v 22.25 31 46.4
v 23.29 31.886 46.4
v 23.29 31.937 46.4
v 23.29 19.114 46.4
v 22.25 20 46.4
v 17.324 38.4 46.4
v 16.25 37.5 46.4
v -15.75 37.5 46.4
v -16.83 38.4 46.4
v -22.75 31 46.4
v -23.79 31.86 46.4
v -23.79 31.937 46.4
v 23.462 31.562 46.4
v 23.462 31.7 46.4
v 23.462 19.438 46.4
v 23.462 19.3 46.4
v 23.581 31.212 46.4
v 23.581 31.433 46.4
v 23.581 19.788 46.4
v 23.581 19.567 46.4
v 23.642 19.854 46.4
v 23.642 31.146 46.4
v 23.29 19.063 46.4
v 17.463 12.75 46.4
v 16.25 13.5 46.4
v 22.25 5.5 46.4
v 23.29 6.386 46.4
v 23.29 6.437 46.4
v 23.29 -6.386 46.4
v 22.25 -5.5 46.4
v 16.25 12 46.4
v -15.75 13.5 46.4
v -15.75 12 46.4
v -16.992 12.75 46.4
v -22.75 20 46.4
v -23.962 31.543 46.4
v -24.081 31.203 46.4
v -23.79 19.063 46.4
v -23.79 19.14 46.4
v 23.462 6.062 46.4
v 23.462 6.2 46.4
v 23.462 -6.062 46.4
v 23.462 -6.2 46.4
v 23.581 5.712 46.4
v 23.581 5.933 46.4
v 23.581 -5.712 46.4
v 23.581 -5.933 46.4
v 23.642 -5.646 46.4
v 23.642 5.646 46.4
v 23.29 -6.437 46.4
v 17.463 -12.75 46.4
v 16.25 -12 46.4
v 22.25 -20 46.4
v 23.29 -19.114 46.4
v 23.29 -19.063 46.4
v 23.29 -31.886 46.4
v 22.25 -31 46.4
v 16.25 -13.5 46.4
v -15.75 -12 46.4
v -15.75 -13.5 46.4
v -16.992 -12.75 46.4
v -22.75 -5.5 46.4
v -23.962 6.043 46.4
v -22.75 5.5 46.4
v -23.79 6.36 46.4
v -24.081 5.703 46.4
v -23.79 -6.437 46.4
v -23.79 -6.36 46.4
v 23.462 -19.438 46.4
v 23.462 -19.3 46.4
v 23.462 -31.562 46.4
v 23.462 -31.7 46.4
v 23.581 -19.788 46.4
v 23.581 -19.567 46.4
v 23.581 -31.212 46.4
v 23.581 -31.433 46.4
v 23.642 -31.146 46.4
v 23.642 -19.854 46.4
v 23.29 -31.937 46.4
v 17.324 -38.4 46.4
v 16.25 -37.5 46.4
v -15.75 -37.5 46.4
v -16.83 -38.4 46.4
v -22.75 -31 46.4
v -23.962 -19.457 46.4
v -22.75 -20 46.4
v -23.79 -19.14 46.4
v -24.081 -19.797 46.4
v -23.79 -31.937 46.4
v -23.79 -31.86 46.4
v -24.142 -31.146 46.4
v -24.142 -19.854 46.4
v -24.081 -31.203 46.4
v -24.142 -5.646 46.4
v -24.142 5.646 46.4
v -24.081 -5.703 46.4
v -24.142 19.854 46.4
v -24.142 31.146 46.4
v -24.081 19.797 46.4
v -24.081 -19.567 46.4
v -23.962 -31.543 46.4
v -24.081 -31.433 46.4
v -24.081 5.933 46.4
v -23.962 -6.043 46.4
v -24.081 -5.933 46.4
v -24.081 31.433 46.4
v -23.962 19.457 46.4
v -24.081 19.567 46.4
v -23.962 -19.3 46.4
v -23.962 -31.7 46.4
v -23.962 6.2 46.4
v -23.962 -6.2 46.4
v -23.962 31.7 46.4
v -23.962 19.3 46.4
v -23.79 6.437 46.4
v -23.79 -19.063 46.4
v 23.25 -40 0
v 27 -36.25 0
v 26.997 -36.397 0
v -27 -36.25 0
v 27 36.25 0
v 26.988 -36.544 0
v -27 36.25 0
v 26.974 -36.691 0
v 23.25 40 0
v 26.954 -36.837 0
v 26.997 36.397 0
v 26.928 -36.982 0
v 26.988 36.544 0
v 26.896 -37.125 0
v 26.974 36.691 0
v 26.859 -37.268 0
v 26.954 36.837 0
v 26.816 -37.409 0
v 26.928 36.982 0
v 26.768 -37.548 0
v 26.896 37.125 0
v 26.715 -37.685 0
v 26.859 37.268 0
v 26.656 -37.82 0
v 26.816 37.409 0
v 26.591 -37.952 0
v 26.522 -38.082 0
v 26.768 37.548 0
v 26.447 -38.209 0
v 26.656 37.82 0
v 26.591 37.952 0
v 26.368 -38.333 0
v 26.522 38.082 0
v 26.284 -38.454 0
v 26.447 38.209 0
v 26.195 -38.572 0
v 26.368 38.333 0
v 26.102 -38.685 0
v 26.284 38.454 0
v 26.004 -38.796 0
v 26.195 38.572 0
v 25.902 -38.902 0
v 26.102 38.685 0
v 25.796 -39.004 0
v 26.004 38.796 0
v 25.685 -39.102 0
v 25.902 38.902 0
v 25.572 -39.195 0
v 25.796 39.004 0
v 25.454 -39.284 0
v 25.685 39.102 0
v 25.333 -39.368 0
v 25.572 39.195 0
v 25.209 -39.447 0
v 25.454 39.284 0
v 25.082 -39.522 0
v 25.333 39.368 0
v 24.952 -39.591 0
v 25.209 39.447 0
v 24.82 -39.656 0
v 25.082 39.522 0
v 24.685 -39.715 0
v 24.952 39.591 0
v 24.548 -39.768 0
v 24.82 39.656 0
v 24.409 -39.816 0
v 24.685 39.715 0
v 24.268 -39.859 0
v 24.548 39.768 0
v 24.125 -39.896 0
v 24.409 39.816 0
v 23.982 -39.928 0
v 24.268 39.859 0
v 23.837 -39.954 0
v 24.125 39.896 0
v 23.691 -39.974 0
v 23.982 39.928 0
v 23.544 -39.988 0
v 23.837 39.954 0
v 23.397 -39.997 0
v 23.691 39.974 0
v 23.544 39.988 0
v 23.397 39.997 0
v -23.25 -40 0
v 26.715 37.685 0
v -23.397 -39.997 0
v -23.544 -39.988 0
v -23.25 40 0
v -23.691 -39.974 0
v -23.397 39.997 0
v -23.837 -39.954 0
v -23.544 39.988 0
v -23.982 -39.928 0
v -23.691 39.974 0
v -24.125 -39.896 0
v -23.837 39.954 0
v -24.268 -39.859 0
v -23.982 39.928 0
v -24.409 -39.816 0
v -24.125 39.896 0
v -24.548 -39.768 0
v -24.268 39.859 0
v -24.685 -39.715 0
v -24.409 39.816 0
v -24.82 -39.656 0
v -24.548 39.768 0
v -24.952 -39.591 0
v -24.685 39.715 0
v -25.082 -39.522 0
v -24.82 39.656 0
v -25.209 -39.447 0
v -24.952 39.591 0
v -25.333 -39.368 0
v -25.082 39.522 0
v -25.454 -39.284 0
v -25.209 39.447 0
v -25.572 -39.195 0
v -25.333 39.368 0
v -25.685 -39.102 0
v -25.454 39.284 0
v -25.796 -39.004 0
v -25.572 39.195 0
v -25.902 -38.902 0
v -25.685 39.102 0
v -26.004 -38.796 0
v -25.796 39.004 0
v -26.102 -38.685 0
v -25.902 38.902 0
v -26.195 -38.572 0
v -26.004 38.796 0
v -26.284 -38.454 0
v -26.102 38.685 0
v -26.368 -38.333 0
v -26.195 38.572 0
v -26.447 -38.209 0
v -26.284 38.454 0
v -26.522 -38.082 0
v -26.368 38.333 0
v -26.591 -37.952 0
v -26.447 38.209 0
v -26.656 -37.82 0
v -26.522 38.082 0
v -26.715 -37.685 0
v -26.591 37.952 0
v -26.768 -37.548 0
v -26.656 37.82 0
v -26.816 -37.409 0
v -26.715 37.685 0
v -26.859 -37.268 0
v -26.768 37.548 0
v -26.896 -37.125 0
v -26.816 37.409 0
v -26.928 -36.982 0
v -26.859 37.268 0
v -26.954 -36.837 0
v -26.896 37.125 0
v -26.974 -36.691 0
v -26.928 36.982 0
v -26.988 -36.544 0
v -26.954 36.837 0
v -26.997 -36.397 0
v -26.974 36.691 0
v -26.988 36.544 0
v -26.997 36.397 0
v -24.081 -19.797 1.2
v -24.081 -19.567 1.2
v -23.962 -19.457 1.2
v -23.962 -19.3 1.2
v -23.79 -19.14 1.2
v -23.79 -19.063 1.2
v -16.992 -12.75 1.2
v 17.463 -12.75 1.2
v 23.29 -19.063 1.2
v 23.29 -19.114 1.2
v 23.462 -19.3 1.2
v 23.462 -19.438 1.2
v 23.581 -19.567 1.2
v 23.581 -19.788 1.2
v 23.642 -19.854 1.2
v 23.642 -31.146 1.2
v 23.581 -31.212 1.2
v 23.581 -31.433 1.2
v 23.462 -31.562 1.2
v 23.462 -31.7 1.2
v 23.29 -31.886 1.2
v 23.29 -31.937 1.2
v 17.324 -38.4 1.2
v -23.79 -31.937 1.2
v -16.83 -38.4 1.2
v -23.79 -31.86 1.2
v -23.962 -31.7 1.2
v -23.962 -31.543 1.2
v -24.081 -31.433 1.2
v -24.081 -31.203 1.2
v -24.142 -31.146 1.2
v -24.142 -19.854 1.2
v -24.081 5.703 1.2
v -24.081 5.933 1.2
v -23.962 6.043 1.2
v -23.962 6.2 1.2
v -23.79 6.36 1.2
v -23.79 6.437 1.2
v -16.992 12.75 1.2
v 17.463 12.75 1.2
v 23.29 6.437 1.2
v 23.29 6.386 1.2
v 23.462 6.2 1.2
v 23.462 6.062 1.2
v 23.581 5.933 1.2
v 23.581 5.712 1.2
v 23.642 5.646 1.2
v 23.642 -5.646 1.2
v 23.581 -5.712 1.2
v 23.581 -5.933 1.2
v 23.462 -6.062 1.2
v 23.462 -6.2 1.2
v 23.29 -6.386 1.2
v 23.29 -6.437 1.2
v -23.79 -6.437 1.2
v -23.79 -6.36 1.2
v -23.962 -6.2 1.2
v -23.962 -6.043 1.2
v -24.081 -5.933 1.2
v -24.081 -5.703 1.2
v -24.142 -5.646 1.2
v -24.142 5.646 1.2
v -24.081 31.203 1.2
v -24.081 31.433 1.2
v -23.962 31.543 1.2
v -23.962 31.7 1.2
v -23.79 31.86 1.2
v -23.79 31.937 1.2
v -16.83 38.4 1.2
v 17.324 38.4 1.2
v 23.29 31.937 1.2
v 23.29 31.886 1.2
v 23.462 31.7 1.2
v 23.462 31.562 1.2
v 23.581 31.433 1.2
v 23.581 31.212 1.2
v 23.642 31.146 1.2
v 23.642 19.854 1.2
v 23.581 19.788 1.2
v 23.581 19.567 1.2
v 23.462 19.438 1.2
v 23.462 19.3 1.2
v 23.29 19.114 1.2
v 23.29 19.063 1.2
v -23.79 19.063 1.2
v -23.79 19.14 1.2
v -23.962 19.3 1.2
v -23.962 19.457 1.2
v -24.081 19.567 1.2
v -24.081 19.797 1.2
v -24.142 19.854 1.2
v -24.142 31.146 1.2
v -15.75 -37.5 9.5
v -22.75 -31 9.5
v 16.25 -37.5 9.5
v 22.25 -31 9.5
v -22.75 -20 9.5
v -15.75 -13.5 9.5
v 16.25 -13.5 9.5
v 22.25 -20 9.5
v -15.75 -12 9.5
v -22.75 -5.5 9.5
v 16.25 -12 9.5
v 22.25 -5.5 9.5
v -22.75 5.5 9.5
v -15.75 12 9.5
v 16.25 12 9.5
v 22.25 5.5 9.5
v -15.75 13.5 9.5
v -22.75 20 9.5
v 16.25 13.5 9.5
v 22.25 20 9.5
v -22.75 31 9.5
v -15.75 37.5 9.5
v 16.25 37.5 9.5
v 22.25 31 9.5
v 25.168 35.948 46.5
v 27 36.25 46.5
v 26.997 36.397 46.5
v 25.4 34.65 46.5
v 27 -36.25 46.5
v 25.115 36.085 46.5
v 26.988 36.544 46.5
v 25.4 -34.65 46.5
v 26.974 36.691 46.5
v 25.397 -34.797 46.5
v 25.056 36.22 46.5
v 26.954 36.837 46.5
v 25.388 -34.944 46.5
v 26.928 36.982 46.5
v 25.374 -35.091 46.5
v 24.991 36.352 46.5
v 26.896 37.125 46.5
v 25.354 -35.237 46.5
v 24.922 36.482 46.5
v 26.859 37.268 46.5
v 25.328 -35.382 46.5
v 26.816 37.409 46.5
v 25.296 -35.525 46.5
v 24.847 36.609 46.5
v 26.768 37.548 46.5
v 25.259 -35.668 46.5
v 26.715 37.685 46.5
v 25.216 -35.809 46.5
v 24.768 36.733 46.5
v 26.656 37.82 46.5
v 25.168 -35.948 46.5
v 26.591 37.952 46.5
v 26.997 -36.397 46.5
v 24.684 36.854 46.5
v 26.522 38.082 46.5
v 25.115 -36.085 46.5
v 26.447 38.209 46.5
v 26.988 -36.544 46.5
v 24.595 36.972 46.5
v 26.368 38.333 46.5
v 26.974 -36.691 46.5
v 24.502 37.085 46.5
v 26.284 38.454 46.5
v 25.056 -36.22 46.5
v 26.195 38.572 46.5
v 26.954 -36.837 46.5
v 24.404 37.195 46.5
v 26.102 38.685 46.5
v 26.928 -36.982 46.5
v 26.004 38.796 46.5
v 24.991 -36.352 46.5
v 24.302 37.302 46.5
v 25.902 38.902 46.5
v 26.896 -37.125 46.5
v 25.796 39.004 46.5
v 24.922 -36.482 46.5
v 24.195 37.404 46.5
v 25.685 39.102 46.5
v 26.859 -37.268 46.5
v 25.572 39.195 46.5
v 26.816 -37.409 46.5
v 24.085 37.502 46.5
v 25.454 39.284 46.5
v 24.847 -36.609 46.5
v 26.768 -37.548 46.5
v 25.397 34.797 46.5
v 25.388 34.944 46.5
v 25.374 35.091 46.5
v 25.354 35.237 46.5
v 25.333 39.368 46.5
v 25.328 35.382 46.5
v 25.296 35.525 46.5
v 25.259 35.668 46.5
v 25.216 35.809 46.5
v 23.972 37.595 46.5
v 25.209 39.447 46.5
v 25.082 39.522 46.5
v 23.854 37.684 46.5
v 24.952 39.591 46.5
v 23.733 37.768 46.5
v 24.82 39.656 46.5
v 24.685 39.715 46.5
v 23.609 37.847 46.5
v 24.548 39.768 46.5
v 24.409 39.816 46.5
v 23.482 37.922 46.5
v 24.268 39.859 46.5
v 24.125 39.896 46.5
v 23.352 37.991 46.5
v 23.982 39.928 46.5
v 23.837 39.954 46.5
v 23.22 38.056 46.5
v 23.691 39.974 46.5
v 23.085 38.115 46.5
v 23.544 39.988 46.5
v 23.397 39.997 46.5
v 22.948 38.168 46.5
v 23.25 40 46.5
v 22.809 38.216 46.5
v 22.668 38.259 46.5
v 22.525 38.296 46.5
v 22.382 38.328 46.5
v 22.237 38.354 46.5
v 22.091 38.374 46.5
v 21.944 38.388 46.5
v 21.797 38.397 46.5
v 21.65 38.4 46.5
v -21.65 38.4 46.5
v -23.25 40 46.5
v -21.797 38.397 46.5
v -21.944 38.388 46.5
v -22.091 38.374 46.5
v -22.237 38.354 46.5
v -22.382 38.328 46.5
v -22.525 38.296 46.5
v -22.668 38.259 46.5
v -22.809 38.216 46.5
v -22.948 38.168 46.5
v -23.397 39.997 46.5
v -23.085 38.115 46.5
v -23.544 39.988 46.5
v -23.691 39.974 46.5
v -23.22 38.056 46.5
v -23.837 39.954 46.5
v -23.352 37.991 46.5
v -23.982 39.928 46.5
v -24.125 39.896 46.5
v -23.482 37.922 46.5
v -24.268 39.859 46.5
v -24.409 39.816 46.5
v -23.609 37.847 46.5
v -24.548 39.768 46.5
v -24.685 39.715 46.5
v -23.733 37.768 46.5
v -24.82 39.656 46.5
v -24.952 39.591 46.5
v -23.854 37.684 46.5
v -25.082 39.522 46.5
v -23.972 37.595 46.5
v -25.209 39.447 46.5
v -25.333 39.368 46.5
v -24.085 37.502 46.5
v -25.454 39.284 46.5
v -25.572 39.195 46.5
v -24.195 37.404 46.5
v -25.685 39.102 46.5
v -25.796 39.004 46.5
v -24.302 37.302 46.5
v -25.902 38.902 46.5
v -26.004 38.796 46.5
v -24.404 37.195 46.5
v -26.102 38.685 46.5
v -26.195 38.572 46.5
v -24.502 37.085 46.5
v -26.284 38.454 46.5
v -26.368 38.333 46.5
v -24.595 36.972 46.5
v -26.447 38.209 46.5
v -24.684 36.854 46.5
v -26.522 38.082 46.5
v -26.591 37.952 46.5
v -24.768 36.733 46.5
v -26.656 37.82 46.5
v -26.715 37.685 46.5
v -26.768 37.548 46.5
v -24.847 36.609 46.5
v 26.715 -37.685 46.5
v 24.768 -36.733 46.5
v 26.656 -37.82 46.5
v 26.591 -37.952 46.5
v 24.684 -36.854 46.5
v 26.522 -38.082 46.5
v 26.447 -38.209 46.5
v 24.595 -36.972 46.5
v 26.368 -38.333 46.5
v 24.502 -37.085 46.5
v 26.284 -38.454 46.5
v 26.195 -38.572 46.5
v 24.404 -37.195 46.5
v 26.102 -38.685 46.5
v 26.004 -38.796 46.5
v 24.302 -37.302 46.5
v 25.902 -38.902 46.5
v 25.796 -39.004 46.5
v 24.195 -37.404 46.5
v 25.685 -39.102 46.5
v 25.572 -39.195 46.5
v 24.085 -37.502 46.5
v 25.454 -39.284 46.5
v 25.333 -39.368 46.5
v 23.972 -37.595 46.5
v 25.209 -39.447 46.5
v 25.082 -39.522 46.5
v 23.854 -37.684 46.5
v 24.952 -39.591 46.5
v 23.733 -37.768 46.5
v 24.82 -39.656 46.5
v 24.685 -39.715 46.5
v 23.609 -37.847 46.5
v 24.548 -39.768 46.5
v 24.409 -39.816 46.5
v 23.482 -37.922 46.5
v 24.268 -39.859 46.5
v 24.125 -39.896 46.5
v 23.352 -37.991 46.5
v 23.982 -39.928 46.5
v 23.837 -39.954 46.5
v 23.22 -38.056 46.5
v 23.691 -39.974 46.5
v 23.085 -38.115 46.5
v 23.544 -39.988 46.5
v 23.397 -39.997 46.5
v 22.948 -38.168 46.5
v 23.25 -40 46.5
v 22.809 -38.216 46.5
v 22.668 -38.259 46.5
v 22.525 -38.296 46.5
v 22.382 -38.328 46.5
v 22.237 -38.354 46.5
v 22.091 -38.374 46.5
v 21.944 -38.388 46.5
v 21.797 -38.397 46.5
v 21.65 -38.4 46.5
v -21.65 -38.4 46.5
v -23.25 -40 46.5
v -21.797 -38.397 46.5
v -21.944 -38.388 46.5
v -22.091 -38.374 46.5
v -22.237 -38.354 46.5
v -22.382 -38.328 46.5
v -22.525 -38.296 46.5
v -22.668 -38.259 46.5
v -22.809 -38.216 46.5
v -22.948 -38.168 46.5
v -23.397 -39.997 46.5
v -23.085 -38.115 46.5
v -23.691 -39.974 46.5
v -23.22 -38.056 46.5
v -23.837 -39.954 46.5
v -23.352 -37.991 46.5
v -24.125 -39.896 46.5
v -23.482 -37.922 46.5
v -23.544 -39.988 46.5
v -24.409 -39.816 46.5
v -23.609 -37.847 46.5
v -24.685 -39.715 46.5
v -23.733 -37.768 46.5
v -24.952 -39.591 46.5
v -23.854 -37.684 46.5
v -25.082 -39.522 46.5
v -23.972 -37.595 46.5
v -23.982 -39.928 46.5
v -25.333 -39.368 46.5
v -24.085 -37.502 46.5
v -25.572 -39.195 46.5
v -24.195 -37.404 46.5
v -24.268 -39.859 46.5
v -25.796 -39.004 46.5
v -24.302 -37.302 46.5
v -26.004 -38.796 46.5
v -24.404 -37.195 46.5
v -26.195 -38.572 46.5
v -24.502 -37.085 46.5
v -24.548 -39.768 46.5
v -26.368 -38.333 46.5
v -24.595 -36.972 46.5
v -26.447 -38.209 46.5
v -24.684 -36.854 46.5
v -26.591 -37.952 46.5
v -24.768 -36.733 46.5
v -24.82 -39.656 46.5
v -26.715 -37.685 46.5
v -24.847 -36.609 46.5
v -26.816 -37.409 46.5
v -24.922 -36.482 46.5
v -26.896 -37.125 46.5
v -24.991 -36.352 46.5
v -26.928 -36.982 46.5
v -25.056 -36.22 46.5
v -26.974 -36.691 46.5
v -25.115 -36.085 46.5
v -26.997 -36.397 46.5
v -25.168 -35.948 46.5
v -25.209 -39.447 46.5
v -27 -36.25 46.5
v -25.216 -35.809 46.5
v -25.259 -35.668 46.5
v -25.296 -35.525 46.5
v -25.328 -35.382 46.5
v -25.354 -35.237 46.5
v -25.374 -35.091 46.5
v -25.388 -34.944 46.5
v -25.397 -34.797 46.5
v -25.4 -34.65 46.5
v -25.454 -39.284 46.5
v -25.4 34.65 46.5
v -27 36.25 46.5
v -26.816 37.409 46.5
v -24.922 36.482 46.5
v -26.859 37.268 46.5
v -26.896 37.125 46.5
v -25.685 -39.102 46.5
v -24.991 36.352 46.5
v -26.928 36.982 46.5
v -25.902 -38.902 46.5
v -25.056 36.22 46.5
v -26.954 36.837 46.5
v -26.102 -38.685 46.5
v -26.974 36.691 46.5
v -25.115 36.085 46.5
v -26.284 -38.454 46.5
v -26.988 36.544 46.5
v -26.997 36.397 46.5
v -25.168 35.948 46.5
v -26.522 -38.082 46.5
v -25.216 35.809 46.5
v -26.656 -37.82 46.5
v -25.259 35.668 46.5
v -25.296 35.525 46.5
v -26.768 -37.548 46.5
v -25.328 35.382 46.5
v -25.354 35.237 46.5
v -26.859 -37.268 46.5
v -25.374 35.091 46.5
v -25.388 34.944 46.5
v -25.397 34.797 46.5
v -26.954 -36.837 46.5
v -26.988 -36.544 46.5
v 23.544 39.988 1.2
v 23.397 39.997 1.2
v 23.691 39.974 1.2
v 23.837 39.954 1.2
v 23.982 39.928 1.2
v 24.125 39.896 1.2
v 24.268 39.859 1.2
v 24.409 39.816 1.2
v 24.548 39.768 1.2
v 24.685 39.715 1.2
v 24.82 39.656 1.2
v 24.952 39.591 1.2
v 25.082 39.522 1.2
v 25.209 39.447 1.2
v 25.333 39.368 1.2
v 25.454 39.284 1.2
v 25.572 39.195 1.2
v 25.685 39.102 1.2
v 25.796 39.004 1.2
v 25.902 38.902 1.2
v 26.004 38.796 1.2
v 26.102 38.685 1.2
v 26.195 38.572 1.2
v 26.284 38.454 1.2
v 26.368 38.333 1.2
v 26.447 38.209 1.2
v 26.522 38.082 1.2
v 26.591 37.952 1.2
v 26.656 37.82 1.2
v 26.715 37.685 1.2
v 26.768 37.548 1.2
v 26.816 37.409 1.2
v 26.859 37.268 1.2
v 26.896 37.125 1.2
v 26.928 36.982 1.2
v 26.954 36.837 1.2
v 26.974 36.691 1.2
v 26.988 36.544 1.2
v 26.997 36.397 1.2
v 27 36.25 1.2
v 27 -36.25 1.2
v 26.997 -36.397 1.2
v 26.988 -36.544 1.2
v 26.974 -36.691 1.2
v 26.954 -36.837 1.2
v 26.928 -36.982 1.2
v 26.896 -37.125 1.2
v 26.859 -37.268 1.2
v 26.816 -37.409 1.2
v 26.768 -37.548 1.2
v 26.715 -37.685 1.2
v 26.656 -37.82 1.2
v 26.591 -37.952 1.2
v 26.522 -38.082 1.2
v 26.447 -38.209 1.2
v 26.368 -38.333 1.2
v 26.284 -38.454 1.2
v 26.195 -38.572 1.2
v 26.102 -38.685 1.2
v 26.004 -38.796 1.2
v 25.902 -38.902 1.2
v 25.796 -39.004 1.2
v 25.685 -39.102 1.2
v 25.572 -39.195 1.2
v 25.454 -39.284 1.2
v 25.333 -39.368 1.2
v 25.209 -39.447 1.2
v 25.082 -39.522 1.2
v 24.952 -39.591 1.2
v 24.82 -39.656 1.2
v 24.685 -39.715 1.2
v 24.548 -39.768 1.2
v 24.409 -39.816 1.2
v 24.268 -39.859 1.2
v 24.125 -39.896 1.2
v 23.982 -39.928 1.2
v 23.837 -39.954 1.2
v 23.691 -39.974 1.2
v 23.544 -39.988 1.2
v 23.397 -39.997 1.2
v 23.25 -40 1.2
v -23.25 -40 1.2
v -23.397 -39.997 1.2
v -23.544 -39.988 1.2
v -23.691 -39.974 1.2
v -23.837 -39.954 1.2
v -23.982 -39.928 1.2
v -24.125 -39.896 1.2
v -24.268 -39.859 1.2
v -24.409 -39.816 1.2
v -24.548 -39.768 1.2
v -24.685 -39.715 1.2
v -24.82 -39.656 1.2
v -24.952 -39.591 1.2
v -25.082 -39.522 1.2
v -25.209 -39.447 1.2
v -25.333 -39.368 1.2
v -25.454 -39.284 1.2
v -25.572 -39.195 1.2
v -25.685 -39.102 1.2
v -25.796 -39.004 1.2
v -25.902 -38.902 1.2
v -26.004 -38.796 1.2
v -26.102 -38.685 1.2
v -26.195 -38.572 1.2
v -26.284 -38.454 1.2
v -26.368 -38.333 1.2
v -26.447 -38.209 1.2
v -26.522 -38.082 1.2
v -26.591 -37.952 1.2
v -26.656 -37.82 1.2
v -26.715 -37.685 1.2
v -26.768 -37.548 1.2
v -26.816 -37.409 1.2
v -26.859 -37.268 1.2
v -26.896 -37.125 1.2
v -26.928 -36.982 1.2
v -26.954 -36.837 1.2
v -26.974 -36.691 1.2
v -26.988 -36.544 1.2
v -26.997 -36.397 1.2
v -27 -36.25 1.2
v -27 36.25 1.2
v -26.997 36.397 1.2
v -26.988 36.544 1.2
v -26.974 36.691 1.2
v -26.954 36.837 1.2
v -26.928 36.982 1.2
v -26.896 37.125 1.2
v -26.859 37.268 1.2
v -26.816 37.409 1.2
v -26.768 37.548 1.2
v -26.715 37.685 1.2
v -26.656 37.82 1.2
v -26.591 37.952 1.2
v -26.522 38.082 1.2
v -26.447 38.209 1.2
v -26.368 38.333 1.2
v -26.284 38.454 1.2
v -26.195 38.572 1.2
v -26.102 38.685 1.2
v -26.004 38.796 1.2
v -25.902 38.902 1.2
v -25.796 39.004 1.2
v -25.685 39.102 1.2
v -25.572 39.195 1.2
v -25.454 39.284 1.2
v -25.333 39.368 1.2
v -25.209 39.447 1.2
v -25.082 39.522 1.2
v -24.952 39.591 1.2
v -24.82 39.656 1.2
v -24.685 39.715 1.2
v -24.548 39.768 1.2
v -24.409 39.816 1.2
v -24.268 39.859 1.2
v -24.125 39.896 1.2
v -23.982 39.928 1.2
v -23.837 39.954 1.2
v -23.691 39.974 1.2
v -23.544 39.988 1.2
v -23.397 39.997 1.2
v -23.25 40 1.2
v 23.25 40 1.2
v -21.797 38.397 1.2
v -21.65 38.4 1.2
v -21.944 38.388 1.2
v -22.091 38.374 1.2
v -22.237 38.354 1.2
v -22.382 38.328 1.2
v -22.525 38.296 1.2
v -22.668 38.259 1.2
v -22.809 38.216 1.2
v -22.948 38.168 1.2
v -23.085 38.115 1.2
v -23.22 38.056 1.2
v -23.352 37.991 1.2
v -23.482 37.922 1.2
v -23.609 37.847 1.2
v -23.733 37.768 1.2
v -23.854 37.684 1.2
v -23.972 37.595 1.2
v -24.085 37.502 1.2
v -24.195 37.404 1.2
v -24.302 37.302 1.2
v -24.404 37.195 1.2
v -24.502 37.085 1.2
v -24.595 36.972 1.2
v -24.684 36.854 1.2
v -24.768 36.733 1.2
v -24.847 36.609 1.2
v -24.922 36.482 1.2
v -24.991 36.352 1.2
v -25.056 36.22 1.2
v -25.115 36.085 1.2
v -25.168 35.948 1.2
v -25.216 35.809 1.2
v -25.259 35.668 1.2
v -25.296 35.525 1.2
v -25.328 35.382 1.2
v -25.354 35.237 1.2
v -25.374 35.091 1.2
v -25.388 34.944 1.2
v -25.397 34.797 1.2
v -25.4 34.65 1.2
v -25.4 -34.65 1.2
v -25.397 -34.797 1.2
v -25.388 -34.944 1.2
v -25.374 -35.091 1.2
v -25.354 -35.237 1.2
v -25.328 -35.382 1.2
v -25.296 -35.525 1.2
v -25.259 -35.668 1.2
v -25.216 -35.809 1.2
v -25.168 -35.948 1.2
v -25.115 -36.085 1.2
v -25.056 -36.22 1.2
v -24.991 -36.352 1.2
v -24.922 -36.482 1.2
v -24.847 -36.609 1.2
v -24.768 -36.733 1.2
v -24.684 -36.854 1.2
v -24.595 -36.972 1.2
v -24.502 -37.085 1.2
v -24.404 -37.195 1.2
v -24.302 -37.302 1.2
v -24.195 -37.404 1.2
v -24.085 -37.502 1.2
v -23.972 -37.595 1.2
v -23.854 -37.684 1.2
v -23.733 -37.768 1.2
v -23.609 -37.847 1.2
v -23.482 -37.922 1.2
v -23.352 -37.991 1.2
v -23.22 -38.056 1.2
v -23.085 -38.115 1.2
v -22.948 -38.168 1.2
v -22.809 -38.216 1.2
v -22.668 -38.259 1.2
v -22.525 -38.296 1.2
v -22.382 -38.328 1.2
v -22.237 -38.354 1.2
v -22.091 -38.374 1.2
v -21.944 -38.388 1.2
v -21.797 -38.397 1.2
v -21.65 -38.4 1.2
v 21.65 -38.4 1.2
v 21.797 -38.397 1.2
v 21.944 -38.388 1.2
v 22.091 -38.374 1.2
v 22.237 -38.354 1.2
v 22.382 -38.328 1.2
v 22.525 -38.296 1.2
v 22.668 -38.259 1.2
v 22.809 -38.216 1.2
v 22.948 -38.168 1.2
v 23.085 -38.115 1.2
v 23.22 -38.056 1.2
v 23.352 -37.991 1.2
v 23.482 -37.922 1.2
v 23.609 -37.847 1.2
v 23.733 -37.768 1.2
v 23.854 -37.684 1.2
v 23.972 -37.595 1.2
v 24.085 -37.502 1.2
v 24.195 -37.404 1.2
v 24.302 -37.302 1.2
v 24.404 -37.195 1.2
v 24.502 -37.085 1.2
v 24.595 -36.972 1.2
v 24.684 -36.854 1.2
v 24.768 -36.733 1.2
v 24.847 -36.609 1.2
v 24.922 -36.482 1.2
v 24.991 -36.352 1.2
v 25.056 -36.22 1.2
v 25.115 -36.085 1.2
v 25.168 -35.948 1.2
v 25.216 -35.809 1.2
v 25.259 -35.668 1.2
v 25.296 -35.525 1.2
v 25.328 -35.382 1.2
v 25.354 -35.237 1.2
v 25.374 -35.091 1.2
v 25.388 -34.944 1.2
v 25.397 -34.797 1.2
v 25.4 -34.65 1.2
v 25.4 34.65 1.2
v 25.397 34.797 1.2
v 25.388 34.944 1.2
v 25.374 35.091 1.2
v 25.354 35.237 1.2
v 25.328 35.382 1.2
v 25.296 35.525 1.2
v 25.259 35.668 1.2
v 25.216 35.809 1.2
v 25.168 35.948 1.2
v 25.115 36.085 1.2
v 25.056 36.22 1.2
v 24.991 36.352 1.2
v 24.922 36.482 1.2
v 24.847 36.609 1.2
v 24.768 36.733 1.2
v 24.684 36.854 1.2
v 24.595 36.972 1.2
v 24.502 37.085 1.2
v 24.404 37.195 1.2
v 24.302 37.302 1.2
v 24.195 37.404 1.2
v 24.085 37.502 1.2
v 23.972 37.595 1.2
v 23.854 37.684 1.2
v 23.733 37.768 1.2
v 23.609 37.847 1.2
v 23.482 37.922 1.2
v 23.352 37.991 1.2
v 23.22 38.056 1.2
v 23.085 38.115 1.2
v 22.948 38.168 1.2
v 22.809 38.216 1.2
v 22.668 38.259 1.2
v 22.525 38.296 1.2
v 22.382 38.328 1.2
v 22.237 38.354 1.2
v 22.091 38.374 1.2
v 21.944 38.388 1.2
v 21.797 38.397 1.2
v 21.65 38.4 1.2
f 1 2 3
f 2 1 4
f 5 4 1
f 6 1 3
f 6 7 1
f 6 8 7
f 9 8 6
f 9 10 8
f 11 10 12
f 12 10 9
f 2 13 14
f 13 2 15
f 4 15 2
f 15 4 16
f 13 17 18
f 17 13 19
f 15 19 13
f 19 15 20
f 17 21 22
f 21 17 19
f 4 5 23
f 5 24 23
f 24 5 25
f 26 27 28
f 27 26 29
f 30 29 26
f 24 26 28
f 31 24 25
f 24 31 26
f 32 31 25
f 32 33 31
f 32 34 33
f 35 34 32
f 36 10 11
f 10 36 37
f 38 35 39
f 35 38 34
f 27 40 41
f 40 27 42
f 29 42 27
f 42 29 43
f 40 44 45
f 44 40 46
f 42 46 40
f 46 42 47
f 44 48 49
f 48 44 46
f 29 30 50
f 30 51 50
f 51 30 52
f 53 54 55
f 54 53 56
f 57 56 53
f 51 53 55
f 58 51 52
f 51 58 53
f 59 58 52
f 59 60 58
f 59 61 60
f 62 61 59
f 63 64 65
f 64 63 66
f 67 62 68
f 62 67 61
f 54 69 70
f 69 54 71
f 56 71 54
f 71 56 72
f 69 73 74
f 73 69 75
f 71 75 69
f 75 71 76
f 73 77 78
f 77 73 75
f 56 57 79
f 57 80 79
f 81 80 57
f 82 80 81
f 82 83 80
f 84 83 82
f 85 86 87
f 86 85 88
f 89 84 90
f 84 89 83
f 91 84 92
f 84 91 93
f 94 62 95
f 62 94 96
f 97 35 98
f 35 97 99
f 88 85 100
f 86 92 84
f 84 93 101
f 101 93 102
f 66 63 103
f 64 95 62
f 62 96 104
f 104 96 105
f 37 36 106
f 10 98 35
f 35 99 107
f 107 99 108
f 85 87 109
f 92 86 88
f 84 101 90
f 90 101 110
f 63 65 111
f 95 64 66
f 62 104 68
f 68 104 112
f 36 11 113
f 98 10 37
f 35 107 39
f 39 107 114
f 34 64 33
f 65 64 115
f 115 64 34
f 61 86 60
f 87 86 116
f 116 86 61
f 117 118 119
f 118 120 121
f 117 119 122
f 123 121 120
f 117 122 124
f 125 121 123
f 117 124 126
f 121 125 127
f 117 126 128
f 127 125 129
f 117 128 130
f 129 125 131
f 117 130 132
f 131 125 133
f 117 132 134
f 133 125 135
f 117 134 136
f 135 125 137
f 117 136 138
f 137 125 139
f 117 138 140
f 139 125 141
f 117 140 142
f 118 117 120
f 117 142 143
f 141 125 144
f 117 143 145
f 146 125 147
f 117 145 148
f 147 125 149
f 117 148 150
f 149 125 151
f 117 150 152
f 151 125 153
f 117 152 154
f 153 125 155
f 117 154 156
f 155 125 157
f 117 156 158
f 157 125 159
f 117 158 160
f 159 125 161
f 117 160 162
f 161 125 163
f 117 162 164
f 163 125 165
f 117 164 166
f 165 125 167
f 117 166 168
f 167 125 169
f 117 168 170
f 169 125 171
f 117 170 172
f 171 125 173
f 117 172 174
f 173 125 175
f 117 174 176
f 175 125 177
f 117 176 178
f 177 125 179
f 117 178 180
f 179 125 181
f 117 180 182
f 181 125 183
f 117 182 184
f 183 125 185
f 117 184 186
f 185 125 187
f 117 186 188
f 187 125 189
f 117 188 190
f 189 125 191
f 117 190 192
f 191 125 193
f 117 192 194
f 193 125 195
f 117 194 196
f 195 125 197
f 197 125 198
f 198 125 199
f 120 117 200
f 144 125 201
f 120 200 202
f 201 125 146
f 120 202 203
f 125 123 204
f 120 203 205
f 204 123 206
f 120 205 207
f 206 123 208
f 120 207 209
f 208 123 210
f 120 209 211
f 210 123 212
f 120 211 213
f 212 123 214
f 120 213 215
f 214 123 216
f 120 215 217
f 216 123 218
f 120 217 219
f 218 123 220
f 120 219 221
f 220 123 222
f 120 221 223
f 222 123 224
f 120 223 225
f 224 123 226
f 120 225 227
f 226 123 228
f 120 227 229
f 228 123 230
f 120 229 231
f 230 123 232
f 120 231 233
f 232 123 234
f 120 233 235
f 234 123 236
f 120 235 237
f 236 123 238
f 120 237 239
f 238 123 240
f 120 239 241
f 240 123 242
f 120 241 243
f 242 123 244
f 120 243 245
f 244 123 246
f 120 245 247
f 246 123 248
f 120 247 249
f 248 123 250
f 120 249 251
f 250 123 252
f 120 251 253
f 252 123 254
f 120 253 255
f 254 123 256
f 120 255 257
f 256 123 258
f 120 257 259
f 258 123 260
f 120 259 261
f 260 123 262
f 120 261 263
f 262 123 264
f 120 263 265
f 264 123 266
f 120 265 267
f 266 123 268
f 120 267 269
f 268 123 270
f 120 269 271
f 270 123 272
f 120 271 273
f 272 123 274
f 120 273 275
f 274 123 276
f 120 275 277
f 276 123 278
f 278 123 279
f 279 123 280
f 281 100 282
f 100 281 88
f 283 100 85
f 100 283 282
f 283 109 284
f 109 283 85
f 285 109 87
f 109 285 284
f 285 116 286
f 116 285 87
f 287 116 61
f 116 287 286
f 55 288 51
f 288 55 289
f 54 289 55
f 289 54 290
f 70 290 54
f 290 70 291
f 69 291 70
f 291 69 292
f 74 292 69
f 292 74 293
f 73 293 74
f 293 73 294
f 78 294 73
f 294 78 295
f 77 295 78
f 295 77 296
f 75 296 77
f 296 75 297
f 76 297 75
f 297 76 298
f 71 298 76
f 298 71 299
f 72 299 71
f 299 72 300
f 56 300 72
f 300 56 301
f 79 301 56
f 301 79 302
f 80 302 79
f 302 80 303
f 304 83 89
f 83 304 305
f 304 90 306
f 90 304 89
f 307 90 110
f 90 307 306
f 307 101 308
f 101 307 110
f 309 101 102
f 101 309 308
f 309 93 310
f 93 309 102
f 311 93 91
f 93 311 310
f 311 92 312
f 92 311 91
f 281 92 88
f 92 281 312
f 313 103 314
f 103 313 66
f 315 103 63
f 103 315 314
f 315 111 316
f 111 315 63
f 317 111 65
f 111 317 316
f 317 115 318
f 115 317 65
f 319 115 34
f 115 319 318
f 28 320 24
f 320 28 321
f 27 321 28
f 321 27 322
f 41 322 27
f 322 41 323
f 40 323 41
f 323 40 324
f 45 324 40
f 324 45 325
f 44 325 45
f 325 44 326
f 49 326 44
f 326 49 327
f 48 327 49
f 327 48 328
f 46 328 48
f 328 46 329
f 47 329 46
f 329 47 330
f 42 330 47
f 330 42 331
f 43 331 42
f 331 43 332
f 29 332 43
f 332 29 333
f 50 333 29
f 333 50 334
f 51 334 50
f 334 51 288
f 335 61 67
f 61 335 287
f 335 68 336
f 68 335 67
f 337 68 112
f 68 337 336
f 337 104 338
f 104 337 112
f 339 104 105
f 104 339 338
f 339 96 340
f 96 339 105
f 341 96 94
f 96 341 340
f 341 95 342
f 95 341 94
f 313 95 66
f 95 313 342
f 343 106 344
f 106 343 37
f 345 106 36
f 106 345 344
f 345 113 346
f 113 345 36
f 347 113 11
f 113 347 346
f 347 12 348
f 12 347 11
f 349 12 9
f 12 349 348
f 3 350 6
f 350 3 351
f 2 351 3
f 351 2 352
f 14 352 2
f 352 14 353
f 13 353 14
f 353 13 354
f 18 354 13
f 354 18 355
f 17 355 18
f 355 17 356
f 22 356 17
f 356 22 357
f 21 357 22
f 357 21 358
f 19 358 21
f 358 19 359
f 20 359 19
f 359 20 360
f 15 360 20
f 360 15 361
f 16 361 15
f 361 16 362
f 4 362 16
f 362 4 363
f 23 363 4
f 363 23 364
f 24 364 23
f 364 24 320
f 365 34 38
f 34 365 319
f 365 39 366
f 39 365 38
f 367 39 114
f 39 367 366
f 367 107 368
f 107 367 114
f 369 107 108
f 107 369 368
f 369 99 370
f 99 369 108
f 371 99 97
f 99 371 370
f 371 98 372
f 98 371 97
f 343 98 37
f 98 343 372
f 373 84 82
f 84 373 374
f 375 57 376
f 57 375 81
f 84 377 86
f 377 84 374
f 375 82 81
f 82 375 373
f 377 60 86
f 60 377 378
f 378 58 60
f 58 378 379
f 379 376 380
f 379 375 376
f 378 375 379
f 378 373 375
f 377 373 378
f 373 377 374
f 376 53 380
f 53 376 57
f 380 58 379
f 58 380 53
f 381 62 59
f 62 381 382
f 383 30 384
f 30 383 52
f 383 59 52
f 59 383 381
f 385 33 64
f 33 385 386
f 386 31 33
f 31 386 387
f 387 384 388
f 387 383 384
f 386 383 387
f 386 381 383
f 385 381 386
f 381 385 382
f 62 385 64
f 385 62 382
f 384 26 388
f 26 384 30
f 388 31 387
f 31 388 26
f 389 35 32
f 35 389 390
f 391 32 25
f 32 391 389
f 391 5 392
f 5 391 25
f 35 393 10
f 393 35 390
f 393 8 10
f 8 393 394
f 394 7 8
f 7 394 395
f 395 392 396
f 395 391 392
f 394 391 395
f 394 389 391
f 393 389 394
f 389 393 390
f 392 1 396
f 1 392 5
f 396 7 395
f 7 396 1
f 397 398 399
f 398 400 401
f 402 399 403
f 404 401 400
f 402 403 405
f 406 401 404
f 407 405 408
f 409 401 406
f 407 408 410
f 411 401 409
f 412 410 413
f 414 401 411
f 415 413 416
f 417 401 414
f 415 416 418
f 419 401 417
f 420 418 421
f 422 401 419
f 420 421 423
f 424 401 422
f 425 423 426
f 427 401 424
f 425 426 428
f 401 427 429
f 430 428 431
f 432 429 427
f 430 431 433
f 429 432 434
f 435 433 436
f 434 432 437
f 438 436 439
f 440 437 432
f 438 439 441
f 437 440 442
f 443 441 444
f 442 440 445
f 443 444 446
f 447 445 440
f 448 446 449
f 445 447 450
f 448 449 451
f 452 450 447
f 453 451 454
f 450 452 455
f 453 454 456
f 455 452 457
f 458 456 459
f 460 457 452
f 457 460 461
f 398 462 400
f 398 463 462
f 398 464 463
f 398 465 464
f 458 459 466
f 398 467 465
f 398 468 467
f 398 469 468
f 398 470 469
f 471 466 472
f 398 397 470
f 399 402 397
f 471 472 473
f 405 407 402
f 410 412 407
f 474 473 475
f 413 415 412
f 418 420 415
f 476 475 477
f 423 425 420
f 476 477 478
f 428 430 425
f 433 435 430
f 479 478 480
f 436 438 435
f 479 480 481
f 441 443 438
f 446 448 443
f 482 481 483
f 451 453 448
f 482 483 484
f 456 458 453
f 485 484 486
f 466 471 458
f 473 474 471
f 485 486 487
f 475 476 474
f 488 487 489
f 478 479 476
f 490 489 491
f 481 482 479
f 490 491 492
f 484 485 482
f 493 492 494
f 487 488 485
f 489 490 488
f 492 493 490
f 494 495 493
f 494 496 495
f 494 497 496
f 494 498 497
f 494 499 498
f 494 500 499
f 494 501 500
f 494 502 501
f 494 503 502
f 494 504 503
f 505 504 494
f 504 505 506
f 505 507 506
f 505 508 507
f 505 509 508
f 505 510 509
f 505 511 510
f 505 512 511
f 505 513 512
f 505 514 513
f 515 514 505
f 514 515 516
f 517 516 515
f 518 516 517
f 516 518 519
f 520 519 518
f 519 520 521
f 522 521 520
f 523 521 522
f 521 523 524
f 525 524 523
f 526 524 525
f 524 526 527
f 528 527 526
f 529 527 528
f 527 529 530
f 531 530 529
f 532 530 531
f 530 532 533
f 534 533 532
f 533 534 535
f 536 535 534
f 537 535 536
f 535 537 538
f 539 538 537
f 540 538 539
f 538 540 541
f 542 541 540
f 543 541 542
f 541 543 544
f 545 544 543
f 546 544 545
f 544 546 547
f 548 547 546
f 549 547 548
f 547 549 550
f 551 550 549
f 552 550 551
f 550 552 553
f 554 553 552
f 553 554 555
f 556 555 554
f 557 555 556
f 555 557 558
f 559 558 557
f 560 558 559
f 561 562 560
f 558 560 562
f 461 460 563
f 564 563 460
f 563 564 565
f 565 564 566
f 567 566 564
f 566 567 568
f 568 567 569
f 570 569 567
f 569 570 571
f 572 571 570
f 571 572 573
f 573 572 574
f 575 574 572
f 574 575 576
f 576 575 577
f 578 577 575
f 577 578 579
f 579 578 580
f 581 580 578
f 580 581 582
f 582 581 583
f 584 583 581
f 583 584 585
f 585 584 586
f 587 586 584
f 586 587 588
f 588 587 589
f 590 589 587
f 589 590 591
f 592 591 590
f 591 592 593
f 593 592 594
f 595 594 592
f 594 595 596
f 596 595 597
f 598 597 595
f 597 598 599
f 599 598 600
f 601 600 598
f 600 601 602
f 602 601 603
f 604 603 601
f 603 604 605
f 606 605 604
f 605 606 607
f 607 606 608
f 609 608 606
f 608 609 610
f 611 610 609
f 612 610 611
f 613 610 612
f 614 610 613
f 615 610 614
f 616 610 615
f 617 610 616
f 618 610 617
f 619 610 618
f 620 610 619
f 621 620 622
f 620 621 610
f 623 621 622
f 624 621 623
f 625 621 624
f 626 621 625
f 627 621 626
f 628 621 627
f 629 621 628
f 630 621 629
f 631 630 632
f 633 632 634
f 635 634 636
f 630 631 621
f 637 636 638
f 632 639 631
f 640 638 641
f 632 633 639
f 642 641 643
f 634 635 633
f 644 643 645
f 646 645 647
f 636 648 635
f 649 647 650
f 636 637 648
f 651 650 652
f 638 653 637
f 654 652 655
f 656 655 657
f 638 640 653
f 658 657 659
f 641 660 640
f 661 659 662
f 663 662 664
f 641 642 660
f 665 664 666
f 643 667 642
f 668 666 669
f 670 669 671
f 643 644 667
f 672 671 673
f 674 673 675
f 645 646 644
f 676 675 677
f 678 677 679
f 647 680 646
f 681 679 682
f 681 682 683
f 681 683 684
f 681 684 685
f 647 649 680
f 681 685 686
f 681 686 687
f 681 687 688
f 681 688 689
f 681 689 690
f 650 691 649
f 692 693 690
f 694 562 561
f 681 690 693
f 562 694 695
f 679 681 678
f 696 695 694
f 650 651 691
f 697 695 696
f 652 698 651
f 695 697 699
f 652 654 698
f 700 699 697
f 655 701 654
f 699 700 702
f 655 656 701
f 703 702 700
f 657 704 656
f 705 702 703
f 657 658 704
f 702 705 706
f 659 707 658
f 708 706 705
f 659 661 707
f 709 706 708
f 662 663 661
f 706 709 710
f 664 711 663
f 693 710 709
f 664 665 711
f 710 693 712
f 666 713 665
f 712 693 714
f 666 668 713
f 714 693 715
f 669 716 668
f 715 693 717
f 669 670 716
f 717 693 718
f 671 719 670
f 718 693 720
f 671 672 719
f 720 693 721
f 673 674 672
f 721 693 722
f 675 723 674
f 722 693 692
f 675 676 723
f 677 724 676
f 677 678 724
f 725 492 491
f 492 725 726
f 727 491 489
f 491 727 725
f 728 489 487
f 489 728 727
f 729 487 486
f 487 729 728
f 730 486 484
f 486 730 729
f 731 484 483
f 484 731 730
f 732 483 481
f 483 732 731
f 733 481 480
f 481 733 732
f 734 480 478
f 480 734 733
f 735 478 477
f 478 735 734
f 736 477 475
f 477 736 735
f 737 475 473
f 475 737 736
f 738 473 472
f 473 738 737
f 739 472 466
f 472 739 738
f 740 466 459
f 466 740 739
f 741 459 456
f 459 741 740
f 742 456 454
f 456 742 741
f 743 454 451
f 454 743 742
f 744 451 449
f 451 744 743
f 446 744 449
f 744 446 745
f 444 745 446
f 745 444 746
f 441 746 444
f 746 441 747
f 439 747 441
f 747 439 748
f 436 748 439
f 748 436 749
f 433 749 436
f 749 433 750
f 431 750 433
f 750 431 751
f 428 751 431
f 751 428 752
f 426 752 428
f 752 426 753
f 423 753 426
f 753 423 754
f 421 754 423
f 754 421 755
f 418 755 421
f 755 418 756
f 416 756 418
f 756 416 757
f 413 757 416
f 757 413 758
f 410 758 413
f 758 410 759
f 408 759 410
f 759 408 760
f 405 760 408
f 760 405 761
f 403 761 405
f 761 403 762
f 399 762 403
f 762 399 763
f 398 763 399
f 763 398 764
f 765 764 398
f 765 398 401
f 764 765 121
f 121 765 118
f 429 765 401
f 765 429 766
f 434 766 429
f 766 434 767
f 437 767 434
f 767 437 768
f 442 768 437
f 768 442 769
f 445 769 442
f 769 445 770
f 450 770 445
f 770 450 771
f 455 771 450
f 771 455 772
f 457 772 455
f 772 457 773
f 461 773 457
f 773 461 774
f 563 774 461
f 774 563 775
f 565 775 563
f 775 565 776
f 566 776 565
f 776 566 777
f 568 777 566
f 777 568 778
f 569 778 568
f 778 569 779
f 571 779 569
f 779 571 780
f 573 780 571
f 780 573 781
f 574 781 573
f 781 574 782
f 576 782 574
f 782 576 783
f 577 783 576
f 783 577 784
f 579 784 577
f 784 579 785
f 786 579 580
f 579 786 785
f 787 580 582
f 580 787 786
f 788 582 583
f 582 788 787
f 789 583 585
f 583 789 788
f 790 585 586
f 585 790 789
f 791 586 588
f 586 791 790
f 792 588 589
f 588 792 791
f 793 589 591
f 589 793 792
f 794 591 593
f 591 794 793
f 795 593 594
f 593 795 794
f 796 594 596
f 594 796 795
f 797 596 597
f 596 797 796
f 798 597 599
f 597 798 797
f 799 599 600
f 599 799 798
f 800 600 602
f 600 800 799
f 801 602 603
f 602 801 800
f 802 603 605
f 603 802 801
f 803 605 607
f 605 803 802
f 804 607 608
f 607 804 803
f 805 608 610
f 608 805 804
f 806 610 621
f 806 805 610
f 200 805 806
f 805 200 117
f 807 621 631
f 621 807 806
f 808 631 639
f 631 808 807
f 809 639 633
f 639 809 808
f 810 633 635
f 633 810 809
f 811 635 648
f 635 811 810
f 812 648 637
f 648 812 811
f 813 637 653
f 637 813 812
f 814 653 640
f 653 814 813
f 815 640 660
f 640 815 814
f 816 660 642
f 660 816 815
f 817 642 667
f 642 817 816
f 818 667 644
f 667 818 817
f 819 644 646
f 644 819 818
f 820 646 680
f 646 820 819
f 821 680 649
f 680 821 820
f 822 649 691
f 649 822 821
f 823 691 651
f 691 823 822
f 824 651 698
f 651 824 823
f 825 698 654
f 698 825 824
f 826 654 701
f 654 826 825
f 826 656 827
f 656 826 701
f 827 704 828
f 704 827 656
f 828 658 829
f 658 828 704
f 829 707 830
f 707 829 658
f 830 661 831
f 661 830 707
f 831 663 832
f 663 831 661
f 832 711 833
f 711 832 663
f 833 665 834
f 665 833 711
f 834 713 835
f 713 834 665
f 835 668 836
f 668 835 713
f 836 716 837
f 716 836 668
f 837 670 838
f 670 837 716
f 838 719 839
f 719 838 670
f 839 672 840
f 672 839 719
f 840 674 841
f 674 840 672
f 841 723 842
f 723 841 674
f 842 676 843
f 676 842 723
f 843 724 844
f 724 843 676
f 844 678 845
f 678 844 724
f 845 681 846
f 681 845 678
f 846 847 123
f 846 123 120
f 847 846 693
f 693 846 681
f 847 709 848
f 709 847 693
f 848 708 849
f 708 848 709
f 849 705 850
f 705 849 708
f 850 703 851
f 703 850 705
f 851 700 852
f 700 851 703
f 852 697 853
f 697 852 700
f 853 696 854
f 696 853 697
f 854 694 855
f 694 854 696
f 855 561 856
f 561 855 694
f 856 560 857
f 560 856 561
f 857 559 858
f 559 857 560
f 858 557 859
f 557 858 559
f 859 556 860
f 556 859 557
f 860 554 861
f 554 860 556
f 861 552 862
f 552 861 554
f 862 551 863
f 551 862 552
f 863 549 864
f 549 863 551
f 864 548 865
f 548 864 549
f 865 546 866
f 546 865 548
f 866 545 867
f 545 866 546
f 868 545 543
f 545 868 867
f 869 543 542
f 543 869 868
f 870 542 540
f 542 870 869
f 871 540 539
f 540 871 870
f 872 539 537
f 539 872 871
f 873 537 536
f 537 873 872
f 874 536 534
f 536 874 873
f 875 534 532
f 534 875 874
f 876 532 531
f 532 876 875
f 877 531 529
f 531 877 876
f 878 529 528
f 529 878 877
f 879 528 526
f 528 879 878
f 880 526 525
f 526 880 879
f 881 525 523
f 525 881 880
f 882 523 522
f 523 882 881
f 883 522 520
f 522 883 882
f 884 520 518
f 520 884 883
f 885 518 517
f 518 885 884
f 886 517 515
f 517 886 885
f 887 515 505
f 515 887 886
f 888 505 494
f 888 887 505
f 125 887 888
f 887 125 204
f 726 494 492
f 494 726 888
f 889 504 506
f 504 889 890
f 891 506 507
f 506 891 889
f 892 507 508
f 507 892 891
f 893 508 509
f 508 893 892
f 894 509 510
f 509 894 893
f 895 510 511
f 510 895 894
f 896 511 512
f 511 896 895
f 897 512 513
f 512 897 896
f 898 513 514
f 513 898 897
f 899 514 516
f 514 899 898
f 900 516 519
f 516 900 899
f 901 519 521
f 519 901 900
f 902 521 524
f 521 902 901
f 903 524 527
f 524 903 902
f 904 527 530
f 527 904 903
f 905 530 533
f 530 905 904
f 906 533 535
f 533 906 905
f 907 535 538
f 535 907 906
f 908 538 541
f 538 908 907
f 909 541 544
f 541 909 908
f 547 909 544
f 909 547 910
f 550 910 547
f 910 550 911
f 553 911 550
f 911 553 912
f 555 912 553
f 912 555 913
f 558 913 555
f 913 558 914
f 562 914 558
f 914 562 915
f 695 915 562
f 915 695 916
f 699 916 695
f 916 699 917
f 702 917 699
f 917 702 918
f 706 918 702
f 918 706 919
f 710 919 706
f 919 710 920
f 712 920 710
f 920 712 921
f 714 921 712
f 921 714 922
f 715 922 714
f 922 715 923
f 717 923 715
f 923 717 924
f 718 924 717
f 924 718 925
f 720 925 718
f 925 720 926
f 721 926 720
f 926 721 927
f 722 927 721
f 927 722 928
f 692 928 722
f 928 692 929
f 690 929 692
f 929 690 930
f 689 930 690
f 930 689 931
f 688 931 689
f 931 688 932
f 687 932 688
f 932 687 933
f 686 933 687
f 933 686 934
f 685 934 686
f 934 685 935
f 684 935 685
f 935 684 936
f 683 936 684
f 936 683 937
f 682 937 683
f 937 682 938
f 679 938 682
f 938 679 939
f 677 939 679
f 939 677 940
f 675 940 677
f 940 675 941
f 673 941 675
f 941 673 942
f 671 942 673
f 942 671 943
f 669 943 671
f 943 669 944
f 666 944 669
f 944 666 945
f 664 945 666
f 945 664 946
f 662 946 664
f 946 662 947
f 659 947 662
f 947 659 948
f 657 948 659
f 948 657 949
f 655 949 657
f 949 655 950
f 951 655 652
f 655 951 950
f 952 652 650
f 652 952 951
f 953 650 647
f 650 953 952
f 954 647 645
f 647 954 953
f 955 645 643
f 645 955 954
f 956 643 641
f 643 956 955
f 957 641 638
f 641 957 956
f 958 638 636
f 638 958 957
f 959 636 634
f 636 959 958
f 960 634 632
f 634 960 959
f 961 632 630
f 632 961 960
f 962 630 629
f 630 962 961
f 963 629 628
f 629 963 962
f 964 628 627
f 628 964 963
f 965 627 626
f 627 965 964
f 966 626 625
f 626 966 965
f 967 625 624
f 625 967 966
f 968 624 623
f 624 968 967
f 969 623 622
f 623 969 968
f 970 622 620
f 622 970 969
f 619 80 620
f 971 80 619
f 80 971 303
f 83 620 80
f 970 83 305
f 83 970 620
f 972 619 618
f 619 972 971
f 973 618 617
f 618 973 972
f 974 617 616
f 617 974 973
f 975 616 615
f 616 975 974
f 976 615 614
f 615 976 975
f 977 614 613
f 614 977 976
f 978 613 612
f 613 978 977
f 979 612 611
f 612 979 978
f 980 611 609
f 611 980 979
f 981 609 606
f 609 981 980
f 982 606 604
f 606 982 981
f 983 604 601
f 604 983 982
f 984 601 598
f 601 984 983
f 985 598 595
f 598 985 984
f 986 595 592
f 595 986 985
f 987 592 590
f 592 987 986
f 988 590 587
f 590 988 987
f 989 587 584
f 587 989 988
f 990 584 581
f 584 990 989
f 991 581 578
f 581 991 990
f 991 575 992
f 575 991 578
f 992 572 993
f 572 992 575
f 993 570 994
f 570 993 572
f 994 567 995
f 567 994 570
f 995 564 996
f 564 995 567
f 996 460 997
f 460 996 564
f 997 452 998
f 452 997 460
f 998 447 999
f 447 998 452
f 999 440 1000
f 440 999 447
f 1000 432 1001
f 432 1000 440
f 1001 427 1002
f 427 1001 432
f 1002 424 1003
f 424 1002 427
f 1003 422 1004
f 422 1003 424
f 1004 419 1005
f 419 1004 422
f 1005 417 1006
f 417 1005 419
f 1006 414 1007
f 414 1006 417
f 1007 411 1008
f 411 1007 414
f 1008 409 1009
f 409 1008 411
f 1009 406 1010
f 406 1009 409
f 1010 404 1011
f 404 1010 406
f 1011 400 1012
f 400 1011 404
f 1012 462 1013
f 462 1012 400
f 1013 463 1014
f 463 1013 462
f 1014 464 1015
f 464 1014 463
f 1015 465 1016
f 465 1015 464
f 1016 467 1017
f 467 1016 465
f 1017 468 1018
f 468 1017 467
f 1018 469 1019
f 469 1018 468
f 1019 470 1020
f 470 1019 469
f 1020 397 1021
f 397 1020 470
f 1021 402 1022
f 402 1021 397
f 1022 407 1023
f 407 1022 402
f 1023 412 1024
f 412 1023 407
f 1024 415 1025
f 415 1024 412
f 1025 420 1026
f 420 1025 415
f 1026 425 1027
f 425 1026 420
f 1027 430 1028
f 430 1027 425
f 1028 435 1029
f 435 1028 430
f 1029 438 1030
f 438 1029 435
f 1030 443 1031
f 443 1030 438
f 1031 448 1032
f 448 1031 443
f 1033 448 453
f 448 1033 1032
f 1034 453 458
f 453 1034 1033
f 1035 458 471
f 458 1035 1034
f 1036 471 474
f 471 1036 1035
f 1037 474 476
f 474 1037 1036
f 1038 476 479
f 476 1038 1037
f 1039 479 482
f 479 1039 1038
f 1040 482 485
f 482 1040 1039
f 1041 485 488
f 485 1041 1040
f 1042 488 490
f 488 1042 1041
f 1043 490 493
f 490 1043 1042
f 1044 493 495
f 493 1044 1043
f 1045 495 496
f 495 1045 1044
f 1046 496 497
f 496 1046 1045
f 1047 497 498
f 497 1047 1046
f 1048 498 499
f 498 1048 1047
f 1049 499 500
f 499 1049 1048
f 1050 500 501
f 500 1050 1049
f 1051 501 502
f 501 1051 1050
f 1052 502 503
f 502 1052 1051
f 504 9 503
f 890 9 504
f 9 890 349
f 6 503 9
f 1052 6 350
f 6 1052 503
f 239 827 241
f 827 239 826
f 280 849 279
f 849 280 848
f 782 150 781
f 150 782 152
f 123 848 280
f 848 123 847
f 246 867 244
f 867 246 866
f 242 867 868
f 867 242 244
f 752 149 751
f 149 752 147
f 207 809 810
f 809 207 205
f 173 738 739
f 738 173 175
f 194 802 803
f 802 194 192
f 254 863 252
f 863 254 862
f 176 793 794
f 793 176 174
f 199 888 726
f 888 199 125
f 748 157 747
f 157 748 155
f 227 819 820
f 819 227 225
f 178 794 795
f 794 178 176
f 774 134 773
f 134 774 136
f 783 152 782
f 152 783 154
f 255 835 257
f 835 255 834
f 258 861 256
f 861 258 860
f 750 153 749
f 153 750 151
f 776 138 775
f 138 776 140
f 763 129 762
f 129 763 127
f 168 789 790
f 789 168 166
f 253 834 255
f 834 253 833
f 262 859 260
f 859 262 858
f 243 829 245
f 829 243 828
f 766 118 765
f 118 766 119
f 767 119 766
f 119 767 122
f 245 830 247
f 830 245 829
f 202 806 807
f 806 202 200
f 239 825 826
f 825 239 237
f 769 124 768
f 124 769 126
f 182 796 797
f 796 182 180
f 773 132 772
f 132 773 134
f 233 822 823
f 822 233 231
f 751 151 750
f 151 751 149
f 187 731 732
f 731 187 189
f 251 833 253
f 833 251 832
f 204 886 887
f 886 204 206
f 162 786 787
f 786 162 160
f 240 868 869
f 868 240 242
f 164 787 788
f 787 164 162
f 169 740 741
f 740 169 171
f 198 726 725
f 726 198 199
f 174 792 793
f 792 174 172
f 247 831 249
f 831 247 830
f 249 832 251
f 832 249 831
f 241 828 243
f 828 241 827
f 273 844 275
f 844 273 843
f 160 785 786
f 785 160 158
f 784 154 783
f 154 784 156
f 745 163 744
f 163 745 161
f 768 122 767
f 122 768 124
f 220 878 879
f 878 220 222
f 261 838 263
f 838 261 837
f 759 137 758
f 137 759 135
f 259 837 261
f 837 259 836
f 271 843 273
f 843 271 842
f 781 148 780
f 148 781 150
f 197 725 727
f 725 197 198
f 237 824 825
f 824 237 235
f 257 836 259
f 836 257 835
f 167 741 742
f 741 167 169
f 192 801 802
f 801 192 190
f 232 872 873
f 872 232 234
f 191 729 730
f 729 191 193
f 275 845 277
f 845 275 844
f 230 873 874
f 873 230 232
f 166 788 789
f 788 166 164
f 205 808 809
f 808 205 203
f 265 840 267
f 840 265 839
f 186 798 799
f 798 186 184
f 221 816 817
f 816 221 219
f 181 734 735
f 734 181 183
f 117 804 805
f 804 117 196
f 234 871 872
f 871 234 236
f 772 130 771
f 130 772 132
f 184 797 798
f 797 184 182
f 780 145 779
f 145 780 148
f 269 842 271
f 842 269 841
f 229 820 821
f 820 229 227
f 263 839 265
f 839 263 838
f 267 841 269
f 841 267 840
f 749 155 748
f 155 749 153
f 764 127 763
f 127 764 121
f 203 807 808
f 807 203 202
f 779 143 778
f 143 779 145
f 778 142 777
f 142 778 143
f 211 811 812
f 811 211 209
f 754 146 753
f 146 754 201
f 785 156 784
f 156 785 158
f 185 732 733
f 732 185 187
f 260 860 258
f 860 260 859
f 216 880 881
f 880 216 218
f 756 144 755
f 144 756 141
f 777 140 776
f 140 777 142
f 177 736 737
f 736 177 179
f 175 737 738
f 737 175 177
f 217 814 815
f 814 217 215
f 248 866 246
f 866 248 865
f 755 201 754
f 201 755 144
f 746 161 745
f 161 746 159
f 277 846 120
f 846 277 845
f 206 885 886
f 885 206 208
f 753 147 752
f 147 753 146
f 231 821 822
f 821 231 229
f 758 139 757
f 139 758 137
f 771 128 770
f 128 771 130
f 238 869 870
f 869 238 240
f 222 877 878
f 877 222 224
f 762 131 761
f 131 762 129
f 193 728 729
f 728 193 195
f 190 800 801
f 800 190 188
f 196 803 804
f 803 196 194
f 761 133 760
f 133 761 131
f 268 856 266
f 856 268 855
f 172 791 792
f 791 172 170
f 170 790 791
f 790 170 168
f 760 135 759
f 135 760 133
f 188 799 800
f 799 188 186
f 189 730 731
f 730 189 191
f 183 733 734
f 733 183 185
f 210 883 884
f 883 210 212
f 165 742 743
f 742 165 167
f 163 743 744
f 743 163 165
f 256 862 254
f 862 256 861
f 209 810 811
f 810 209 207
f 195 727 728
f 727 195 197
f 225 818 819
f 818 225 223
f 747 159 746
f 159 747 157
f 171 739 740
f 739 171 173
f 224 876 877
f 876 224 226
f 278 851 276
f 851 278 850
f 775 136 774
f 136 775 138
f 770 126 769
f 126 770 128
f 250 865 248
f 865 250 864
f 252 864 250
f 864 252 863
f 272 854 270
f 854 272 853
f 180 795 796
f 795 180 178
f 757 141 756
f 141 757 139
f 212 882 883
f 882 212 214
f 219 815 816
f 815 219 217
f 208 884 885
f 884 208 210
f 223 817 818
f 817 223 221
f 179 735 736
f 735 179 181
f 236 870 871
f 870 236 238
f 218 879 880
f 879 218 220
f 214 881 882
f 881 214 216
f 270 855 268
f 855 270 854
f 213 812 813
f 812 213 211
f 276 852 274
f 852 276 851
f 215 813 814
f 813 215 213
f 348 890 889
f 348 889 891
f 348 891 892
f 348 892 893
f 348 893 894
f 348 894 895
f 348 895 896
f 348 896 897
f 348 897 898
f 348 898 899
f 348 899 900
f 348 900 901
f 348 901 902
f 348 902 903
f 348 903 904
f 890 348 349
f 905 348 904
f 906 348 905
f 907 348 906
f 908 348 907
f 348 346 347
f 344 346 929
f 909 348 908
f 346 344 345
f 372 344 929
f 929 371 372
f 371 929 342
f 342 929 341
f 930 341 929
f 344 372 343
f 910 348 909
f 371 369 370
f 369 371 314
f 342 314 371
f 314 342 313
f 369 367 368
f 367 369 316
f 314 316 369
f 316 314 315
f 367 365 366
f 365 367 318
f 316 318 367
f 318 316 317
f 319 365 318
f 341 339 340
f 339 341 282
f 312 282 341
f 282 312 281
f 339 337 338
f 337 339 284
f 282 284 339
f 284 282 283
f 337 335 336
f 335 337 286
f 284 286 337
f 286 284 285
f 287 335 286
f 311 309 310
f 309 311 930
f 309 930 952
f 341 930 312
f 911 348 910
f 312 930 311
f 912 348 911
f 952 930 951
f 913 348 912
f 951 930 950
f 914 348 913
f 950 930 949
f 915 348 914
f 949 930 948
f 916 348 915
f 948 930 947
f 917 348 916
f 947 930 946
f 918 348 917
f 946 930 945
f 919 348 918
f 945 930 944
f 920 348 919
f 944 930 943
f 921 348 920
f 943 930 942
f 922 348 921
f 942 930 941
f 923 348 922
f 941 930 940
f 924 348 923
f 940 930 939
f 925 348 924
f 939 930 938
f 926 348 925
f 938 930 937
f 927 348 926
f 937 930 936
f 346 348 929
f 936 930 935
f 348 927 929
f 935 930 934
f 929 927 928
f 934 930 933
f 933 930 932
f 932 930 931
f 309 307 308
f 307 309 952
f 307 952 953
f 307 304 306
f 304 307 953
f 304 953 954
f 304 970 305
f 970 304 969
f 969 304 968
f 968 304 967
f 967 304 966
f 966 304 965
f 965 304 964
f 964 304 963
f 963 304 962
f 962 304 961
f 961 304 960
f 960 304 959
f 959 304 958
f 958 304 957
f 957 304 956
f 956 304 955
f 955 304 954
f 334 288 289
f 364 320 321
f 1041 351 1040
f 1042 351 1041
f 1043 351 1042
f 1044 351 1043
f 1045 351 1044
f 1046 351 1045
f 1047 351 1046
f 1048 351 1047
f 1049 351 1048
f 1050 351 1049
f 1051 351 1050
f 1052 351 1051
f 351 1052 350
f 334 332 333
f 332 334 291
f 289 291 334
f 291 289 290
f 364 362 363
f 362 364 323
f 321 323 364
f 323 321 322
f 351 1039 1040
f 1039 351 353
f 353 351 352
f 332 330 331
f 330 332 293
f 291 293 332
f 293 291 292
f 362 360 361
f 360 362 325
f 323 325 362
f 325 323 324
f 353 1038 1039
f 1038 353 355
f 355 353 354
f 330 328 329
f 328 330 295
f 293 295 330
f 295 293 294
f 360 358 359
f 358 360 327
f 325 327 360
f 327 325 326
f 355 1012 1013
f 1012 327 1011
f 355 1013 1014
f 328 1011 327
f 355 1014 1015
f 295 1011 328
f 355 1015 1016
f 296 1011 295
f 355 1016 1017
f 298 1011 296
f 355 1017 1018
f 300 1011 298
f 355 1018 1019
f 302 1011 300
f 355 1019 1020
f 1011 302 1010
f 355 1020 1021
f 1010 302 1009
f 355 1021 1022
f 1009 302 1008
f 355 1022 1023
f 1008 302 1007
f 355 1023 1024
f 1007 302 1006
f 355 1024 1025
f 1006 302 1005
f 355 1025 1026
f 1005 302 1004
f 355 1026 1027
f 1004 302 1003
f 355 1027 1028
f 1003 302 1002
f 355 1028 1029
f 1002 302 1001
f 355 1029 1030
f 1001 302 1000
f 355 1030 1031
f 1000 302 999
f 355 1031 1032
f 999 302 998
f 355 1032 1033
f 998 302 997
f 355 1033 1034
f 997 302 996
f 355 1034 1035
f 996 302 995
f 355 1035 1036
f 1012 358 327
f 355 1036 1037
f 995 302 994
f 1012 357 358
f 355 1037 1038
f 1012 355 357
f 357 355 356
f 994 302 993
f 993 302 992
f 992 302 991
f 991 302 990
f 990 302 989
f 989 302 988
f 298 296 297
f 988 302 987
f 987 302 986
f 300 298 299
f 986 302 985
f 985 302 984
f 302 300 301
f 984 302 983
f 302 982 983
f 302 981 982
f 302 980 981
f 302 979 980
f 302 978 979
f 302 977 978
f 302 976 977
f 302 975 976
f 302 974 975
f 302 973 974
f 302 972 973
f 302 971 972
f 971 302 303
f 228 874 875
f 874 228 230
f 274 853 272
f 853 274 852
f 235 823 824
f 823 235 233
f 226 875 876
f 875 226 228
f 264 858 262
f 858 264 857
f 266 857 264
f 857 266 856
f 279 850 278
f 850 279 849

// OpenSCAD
/* tie-bomber-bin.scad
 *
 * Copyright (C) Robert B. Ross, 2016
 *
 * This software is released under the Creative Commons Attribution
 * License. It is derived from the model by devonjones as downloaded on
 * 4/29/2016 from the following URL:
 *   http://www.thingiverse.com/thing:1255003
 *
 */

include <./bintools.scad>

$fn=160;
binHeight = 46.5;
angle=0;

/* locations is a pair of triples, translate : rotate pairs
 */
locations = [[[0,25.5,0], [0,0,90]],
             [[0,0,0], [0,0,90]],
             [[0,-25.5,0], [0,0,90]]];

harborFreightMediumFullHt(locations,inset=1) bomberBlank();

// bomberOutline();
// bomberBlank();

/* bomberOutline() -- test piece for outline
 */
module bomberOutline() {
   translate([0,0,37]) rotate([180,0,0]) {
      blankCutout(height=37 - 0.1, outlineScale=1.2) bomberBlank();
   }
}

module bomberBlank(centerCutout=1) {
   blankHeight = 37; 

   translate([-13,-26,0]) hull() {
      translate([1,51.5/2-32/2,0]) cube([24,32,blankHeight]);
      translate([1+(24-11)/2,51.5/2-44/2,0]) cube([11,45,blankHeight]);
   }
}

/* bomberShell() -- outline */
module bomberShell() {
   for (i=[0:1]) mirror([i,0,0]) 
      polygon(points=[[0,-31.5],[-5.7,-31.5], [-23.1,-31.5],[-24.1,-30.5],
         [-25.4,-14.6],[-24.5,-13.5],[-8.1,-12.1], [-6.5,-10.2],[-6.5,0.5],
         [-5.5,2.23],[-4.95,16.3],[-2.1,31.5],[0,31.5]]);
}

/*
 * Local variables:
 *  mode: C
 *  c-indent-level: 3
 *  c-basic-offset: 3
 * End:
 *
 * vim: ts=8 sts=3 sw=3 expandtab
 */
